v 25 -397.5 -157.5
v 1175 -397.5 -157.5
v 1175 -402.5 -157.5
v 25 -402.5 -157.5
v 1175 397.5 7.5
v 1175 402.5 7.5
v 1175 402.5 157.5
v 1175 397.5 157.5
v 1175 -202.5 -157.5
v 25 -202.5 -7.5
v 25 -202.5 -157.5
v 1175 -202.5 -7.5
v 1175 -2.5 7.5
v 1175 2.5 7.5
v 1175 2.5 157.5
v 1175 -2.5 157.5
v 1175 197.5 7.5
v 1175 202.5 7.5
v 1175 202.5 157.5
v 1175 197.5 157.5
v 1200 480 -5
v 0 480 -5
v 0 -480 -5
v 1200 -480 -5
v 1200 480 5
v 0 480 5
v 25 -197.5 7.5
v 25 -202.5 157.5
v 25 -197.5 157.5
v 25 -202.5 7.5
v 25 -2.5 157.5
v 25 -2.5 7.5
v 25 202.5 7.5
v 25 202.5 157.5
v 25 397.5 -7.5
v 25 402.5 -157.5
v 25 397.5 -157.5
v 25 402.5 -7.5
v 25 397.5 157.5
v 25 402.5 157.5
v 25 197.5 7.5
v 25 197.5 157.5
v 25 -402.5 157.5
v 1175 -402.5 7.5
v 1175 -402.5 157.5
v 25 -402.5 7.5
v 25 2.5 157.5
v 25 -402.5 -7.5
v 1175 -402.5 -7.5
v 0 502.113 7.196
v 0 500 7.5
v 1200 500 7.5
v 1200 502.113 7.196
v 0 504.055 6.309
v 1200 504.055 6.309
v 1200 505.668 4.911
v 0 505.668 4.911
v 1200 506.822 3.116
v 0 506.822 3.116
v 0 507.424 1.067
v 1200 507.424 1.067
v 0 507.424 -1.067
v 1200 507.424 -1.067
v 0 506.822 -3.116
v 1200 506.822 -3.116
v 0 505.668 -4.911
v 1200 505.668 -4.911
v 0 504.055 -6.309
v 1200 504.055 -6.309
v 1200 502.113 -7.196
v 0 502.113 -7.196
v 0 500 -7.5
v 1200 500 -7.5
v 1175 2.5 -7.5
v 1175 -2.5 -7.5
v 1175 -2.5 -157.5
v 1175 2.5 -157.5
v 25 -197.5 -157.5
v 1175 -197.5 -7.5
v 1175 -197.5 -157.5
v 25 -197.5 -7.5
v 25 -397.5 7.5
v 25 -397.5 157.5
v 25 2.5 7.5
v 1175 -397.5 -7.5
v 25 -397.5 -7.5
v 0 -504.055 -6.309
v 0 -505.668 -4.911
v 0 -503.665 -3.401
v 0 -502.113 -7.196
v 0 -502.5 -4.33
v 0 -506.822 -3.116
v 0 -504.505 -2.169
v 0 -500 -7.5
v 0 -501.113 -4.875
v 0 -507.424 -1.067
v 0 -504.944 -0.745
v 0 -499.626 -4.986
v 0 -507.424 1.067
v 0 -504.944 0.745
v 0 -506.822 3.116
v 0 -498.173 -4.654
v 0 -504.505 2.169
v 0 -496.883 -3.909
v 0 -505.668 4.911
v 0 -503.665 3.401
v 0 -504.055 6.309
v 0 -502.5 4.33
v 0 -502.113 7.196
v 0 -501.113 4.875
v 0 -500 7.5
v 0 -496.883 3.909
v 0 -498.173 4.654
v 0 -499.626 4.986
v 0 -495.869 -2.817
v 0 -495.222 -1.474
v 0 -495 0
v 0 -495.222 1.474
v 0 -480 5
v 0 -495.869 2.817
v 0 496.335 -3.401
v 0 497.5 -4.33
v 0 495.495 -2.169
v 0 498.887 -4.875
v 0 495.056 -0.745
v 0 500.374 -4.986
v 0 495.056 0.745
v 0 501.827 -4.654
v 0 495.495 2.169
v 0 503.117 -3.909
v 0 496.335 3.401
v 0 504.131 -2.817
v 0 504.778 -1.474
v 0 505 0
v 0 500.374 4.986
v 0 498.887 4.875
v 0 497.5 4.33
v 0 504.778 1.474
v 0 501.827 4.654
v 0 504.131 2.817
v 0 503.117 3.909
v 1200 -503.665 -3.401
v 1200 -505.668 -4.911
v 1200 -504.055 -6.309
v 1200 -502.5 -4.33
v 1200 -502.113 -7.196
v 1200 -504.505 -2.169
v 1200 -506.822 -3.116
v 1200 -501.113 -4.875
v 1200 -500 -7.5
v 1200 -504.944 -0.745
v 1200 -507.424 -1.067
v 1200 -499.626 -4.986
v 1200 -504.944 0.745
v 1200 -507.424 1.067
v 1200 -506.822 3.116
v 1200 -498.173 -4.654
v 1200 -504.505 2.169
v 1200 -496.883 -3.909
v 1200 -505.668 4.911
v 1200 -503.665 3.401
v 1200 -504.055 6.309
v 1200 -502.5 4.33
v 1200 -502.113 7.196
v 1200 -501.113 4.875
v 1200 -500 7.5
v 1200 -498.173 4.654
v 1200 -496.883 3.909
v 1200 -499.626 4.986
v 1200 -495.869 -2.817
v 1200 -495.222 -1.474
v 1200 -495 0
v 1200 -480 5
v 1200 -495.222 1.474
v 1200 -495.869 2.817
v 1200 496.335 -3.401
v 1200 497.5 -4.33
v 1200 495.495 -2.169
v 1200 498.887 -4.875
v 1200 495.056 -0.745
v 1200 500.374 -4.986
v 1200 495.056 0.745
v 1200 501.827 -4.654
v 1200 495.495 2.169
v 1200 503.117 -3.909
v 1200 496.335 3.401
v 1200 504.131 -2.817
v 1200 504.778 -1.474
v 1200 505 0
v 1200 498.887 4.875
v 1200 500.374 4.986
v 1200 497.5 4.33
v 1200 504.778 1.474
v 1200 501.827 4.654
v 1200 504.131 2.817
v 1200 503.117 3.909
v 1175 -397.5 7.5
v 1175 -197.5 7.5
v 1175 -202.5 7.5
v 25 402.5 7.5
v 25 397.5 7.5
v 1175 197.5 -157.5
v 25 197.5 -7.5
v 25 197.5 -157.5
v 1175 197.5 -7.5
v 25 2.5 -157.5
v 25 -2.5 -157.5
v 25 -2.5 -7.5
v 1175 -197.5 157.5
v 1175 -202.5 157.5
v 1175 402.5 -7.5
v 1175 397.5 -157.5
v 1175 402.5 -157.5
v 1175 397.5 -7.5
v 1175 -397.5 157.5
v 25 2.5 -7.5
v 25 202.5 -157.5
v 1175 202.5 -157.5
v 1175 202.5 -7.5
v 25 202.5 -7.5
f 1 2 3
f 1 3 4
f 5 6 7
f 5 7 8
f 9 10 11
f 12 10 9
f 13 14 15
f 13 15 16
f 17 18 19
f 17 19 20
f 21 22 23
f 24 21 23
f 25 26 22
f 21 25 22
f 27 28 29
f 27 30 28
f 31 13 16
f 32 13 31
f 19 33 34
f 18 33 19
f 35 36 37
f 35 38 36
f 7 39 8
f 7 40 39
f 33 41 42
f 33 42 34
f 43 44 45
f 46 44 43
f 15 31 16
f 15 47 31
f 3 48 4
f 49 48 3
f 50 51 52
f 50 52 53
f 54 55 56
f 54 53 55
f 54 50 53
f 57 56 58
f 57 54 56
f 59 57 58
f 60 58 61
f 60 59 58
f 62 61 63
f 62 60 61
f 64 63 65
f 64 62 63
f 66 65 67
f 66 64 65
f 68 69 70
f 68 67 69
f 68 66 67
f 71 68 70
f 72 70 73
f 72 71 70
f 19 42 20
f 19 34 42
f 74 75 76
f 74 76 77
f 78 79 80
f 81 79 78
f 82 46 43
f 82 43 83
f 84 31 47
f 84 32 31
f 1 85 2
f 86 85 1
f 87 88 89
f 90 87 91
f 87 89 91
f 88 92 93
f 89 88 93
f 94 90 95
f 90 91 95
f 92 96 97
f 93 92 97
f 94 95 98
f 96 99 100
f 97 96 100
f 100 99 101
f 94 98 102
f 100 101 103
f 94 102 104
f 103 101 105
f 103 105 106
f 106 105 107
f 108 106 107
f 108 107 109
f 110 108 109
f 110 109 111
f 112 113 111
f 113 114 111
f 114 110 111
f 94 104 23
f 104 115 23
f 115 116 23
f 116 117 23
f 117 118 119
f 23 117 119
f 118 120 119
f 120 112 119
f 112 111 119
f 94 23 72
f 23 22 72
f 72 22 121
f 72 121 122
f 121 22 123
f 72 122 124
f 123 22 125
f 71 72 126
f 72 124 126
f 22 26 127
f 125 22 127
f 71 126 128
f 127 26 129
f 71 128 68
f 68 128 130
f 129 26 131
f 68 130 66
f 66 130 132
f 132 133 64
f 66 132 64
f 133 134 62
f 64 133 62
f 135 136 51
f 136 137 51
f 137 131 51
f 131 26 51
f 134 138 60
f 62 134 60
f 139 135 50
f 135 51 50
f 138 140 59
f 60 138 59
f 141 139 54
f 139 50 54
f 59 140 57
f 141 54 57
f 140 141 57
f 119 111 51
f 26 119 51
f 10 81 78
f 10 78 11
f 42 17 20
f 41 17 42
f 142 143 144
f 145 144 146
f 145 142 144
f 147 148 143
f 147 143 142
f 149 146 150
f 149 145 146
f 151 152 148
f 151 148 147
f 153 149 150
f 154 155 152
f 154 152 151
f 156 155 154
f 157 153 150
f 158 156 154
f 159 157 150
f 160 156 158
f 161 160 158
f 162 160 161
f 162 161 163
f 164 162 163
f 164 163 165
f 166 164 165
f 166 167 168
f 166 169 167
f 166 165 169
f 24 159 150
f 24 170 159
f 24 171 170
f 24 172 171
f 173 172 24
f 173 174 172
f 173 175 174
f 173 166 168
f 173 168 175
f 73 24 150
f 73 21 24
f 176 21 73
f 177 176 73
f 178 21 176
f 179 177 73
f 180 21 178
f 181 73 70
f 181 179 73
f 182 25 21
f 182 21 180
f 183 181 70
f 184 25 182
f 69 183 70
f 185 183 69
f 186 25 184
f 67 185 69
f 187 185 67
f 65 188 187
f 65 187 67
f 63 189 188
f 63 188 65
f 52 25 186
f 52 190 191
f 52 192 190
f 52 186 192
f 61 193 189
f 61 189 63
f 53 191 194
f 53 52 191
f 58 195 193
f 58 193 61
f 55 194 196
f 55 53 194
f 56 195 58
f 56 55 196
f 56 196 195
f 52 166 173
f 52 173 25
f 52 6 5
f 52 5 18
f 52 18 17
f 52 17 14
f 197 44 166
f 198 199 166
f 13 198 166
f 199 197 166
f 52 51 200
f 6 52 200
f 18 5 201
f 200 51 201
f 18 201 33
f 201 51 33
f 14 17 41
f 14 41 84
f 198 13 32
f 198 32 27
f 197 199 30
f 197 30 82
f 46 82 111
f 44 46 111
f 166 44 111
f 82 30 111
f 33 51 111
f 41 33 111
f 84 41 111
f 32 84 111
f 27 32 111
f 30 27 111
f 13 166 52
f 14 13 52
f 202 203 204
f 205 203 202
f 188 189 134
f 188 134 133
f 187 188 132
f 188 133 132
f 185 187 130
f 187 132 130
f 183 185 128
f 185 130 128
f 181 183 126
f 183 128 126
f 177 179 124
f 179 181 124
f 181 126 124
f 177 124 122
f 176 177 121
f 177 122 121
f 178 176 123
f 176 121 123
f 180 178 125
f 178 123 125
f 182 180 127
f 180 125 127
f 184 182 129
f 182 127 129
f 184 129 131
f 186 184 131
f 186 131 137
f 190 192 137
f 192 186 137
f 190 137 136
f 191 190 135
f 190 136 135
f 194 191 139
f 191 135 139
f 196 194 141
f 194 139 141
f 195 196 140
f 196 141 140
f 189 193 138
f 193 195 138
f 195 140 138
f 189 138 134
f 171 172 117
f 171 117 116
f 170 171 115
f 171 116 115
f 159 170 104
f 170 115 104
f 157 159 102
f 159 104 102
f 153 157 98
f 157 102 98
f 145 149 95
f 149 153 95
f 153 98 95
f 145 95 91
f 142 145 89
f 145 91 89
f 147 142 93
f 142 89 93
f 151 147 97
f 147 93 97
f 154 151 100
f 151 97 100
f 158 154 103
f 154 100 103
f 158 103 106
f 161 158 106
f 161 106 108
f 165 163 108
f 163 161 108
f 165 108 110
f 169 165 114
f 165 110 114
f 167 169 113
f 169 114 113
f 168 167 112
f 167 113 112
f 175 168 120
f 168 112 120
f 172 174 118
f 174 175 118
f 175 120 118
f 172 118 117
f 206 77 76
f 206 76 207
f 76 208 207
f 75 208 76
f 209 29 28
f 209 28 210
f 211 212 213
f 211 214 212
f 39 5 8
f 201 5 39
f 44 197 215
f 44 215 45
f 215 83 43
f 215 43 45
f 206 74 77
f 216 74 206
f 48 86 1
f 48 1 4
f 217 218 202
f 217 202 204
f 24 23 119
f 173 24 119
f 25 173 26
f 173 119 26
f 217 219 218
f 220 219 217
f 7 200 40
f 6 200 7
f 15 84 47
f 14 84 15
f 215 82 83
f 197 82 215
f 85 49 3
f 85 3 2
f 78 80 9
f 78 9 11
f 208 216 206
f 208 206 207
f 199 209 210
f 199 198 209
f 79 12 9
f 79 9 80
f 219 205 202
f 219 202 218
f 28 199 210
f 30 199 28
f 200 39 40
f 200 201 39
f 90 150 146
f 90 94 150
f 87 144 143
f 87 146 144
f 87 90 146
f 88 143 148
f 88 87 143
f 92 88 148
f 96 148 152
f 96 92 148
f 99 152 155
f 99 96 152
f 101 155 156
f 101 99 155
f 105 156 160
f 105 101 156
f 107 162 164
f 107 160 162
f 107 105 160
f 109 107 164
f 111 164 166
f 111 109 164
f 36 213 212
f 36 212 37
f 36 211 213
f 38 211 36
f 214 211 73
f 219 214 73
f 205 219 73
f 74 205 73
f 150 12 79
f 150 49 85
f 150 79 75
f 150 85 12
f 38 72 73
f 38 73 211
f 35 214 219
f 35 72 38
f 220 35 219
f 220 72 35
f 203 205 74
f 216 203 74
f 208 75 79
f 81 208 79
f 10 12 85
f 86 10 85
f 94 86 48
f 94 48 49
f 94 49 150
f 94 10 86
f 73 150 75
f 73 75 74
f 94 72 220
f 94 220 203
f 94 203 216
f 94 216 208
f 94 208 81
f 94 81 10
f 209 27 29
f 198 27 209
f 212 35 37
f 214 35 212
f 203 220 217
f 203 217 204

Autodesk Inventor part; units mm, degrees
ref_plane "YZ Plane" through (0, 0, 0) normal (1, 0, 0) x (0, 1, 0)
ref_plane "XZ Plane" through (0, 0, 0) normal (0, 1, 0) x (-1, 0, 0)
ref_plane "XY Plane" through (0, 0, 0) normal (0, 0, 1) x (1, 0, 0)
sketch "Sketch1" plane through (0, 0, 0) normal (1, 0, 0) x (0, 1, 0)
  circle A0 centre (500, 0) radius 5
  arc A1 (500, -7.5) -> (500, 7.5) centre (500, 0) ccw
  circle A2 centre (-500, 0) radius 5
  arc A3 (-500, 7.5) -> (-500, -7.5) centre (-500, 0) ccw
  line L0 (500, -7.5) -> (-500, -7.5)
  line L1 (500, 7.5) -> (-500, 7.5)
  line L2 (-480, 5) -> (480, 5)
  line L3 (480, 5) -> (480, -5)
  line L4 (480, -5) -> (-480, -5)
  line L5 (-480, -5) -> (-480, 5)
  line L6 (-480, 5) -> (480, -5) construction
  line L7 (480, 5) -> (-480, -5) construction
  point P0 (0, 0)
  dimension "d0" = 10
  dimension "d1" = 15
  dimension "d2" = 10
  dimension "d3" = 15
  dimension "d4" = 1000
  dimension "d5" = 1000
  dimension "d6" = 960
  dimension "d7" = 10
extrude "Extrusion1" add sketch "Sketch1" along normal blind 1200
sketch "Sketch2" plane through (0, -500, 7.5) normal (0, 0, 1) x (1, 0, 0)
  line L0 (25, 902.5) -> (1175, 902.5)
  line L1 (1175, 902.5) -> (1175, 897.5)
  line L2 (1175, 897.5) -> (25, 897.5)
  line L3 (25, 897.5) -> (25, 902.5)
  line L4 (25, 902.5) -> (1175, 897.5) construction
  line L5 (1175, 902.5) -> (25, 897.5) construction
  line L6 (1175, 697.5) -> (25, 697.5)
  line L7 (25, 702.5) -> (1175, 702.5)
  line L8 (25, 697.5) -> (25, 702.5)
  line L9 (1175, 702.5) -> (1175, 697.5)
  line L10 (1175, 497.5) -> (25, 497.5)
  line L11 (25, 502.5) -> (1175, 502.5)
  line L12 (25, 497.5) -> (25, 502.5)
  line L13 (1175, 502.5) -> (1175, 497.5)
  line L14 (1175, 297.5) -> (25, 297.5)
  line L15 (25, 302.5) -> (1175, 302.5)
  line L16 (25, 297.5) -> (25, 302.5)
  line L17 (1175, 302.5) -> (1175, 297.5)
  line L18 (1175, 97.5) -> (25, 97.5)
  line L19 (25, 102.5) -> (1175, 102.5)
  line L20 (25, 97.5) -> (25, 102.5)
  line L21 (1175, 102.5) -> (1175, 97.5)
  point P0 (600, 900)
  dimension "d10" = 1150
  dimension "d11" = 5
  dimension "d14" = 200
extrude "Extrusion2" add sketch "Sketch2" along normal blind 150
sketch "Sketch3" plane through (0, -500, -7.5) normal (0, 0, -1) x (-1, 0, 0)
  line L0 (-25, 897.5) -> (-1175, 897.5) projected
  line L1 (-1175, 902.5) -> (-25, 902.5)
  line L2 (-25, 902.5) -> (-25, 897.5)
  line L3 (-25, 897.5) -> (-1175, 897.5)
  line L4 (-1175, 897.5) -> (-1175, 902.5)
  line L5 (-1175, 902.5) -> (-25, 897.5) construction
  line L6 (-25, 902.5) -> (-1175, 897.5) construction
  line L7 (-1175, 702.5) -> (-25, 702.5)
  line L8 (-25, 697.5) -> (-1175, 697.5)
  line L9 (-1175, 697.5) -> (-1175, 702.5)
  line L10 (-25, 702.5) -> (-25, 697.5)
  line L11 (-1175, 502.5) -> (-25, 502.5)
  line L12 (-25, 497.5) -> (-1175, 497.5)
  line L13 (-1175, 497.5) -> (-1175, 502.5)
  line L14 (-25, 502.5) -> (-25, 497.5)
  line L15 (-1175, 302.5) -> (-25, 302.5)
  line L16 (-25, 297.5) -> (-1175, 297.5)
  line L17 (-1175, 297.5) -> (-1175, 302.5)
  line L18 (-25, 302.5) -> (-25, 297.5)
  line L19 (-1175, 102.5) -> (-25, 102.5)
  line L20 (-25, 97.5) -> (-1175, 97.5)
  line L21 (-1175, 97.5) -> (-1175, 102.5)
  line L22 (-25, 102.5) -> (-25, 97.5)
  point P0 (0, 500)
  point P1 (-600, 900)
  dimension "d21" = 5
  dimension "d24" = 200
extrude "Extrusion3" add sketch "Sketch3" along normal blind 150
properties part number "Layered Belt"
